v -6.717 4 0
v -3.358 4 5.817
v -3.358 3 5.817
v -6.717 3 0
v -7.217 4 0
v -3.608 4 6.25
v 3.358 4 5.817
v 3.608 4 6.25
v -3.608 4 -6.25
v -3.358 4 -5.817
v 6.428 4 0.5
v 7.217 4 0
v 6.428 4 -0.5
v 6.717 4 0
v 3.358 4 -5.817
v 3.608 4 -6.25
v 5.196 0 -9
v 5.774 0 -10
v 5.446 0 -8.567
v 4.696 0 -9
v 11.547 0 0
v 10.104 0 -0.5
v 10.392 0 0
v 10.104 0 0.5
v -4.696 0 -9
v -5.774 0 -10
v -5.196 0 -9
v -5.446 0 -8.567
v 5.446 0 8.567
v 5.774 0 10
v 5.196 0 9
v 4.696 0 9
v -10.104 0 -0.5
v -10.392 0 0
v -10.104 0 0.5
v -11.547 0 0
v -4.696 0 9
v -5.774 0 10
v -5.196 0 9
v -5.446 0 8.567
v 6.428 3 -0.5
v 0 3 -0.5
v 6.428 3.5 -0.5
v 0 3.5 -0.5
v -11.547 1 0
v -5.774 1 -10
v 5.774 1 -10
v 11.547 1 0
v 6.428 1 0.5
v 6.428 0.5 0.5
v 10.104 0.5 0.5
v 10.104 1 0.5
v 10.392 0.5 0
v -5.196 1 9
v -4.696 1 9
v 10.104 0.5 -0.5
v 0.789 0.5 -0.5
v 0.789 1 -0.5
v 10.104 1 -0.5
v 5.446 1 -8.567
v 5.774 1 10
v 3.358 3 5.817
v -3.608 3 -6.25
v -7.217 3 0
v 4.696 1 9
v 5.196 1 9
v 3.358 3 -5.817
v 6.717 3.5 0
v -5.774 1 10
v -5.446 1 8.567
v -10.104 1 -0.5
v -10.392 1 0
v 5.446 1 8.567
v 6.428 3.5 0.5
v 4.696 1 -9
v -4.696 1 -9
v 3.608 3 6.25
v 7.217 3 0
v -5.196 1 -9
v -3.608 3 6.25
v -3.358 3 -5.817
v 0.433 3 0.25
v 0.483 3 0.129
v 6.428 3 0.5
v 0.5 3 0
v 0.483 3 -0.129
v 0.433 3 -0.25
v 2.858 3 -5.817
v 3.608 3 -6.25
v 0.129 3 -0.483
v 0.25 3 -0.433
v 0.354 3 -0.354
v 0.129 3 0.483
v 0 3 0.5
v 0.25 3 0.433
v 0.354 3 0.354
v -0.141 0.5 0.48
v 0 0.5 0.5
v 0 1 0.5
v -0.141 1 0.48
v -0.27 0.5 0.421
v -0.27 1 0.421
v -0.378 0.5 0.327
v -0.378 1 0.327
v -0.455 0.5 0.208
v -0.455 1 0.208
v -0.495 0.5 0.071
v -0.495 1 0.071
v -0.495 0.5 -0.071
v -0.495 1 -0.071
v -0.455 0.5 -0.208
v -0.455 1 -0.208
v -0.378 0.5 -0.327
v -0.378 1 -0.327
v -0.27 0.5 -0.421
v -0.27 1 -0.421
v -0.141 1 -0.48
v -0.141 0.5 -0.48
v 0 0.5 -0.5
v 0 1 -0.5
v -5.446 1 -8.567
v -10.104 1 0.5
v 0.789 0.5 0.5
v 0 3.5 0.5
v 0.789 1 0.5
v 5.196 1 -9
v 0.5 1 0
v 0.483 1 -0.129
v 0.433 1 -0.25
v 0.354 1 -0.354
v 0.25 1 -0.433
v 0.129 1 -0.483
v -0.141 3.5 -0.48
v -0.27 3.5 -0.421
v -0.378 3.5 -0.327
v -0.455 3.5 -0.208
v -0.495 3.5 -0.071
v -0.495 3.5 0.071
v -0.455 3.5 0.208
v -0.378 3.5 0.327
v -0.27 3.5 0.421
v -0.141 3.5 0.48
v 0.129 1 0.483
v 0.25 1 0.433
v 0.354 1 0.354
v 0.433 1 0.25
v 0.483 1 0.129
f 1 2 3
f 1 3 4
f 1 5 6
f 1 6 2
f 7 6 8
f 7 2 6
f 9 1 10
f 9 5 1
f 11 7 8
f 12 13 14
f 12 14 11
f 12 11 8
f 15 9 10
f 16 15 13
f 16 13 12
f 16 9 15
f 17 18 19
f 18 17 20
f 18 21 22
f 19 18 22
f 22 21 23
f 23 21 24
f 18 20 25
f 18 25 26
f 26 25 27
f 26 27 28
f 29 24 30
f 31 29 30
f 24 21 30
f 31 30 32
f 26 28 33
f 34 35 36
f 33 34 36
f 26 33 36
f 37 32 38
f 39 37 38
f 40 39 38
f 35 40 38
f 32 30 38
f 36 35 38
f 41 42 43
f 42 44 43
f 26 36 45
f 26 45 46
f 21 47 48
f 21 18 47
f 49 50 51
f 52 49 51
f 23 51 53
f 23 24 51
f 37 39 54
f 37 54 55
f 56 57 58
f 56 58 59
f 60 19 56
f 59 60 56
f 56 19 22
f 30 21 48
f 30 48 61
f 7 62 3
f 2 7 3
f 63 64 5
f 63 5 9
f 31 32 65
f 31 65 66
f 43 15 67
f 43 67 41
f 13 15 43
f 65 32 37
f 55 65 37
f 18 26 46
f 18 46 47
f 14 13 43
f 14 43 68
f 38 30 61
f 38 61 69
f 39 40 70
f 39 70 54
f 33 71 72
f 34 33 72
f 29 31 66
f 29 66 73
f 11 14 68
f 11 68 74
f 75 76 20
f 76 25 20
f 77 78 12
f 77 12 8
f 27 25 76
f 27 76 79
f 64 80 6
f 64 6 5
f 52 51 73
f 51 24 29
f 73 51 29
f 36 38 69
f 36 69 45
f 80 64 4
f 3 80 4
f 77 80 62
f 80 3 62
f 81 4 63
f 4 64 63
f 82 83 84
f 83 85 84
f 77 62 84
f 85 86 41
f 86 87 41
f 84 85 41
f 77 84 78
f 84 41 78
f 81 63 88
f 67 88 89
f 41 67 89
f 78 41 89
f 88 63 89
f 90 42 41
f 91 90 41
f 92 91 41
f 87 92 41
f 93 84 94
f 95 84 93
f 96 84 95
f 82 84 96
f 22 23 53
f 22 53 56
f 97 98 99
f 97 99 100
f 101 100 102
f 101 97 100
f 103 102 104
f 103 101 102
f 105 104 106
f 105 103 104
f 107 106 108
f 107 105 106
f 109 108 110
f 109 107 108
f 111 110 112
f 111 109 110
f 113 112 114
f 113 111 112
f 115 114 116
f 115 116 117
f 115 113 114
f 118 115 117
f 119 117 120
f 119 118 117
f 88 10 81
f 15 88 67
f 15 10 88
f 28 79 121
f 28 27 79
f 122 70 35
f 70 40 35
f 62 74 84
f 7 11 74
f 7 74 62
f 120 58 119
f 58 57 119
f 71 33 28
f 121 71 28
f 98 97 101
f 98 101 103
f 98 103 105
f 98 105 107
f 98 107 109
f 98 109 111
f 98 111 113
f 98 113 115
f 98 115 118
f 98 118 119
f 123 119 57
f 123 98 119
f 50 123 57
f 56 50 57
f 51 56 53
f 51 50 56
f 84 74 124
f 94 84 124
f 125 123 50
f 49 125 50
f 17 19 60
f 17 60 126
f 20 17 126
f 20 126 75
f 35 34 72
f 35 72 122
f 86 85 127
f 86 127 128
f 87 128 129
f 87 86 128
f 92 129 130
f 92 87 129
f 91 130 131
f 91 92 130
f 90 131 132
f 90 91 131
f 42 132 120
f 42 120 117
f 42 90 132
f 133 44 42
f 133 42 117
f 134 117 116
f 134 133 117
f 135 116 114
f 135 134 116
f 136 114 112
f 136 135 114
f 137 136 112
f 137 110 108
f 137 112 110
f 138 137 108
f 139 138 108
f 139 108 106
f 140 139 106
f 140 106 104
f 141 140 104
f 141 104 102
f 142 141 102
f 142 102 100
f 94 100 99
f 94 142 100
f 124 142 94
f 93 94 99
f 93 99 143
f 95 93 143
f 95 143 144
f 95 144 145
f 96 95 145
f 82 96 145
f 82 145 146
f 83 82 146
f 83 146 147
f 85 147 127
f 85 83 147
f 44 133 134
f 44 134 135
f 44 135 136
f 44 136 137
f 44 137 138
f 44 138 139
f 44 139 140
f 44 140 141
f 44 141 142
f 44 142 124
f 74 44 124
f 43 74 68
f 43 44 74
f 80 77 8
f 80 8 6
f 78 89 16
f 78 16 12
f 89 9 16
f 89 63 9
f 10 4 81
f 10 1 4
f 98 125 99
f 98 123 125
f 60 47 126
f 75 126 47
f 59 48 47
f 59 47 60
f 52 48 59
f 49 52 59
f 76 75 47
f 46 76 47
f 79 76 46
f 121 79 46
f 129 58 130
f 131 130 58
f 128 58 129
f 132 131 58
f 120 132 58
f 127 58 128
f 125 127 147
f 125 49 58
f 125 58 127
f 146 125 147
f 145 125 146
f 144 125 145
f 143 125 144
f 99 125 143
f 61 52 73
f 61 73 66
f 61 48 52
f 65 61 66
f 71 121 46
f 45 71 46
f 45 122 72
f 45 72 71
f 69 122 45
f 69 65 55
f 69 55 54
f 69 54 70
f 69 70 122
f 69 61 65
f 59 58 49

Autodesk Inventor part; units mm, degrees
ref_plane "YZ Plane" through (0, 0, 0) normal (1, 0, 0) x (0, 1, 0)
ref_plane "XZ Plane" through (0, 0, 0) normal (0, 1, 0) x (-1, 0, 0)
ref_plane "XY Plane" through (0, 0, 0) normal (0, 0, 1) x (1, 0, 0)
sketch "Sketch1" plane through (0, 0, 0) normal (0, 1, 0) x (-1, 0, 0)
  line L0 (5.7735, 10) -> (11.547, 0)
  line L1 (11.547, 0) -> (5.7735, -10)
  line L2 (5.7735, -10) -> (-5.7735, -10)
  line L3 (-5.7735, -10) -> (-11.547, 0)
  line L4 (-11.547, 0) -> (-5.7735, 10)
  line L5 (-5.7735, 10) -> (5.7735, 10)
  line L6 (10.3923, 0) -> (5.1962, -9)
  line L7 (5.1962, -9) -> (-5.1962, -9)
  line L8 (-5.1962, -9) -> (-10.3923, 0)
  line L9 (-10.3923, 0) -> (-5.1962, 9)
  line L10 (-5.1962, 9) -> (5.1962, 9)
  line L11 (5.1962, 9) -> (10.3923, 0)
  line L12 (0, 0.5) -> (11.2583, 0.5)
  line L13 (0, 0) -> (5.7735, 10)
  line L14 (0, 0) -> (-5.7735, 10)
  line L15 (11.547, 0) -> (-11.547, 0)
  line L16 (0, 0.5) -> (-11.2583, 0.5)
  line L17 (-0.5, 0) -> (-6.0235, 9.567)
  line L18 (0.5, 0) -> (-5.2735, 10)
  line L19 (-0.5, 0) -> (5.2735, 10)
  line L20 (-0.5, 0) -> (11.047, 0) construction
  line L21 (0.5, 0) -> (6.0235, 9.567)
  line L22 (0, -0.5) -> (11.2583, -0.5)
  line L23 (0, 0) -> (5.7735, -10)
  line L24 (0, 0) -> (-5.7735, -10)
  line L25 (0, -0.5) -> (-11.2583, -0.5)
  line L26 (-0.5, 0) -> (-6.0235, -9.567)
  line L27 (0.5, 0) -> (-5.2735, -10)
  line L28 (-0.5, 0) -> (5.2735, -10)
  line L29 (0.5, 0) -> (6.0235, -9.567)
  point P0 (-10.1036, 0.5)
  point P1 (-5.4462, 8.567)
  point P2 (-0.7887, 0.5)
  point P3 (10.1036, 0.5)
  point P4 (0.7887, 0.5)
  point P5 (5.4462, 8.567)
  point P6 (4.6962, -9)
  point P7 (-4.6962, -9)
  point P8 (0, -0.866)
  point P9 (-5.4462, -8.567)
  point P10 (-10.1036, -0.5)
  point P11 (-0.7887, -0.5)
  point P12 (10.1036, -0.5)
  point P13 (5.4462, -8.567)
  point P14 (0.7887, -0.5)
  point P15 (-4.6962, 9)
  point P16 (4.6962, 9)
  point P17 (0, 0.866)
  dimension "d0" = 20
  dimension "d1" = 18
  dimension "d2" = 60
extrude "Extrusion1" add sketch "Sketch1" along normal blind 1 contours L13 L10 L19 L5 | L0 L21 L11 L13 | L0 L12 L11 L21 | L19 L10 L18 L5 | L13 L12 L18 L19 L10 | L11 L21 L12 L13 | L0 L15 L11 L12 | L18 L10 L14 L5 | L13 L18 L12 | L12 L21 L18 L13 | L1 L22 L6 L15 | L11 L15 L21 L12 | L14 L9 L17 L4 | L18 L19 L16 L14 L10 | L18 L12 L16 L19 | L18 L13 L14 L19 L16 L12 | L18 L15 L13 | L1 L29 L6 L22 | L6 L22 L29 L15 | L27 L23 L15 | L29 L22 L23 L27 | L17 L9 L16 L4 | L14 L16 L17 L9 | L19 L14 L16 | L15 L19 L14 | L24 L28 L15 | L23 L27 L22 L25 L28 L24 | L1 L23 L6 L29 | L23 L22 L27 | L29 L6 L23 L22 | L16 L9 L15 L4 | L14 L19 L17 L16 | L26 L25 L8 L15 | L15 L9 L16 L17 | L28 L24 L25 L26 | L28 L25 L24 | L2 L28 L7 L23 | L23 L7 L28 L27 L22 | L27 L28 L25 L22 | L15 L8 L25 L3 | L25 L24 L8 L26 | L25 L28 L27 L7 L24 | L2 L27 L7 L28 | L25 L8 L26 L3 | L8 L24 L3 L26 | L7 L27 L2 L24
sketch "Sketch2" plane through (0, 1, 0) normal (0, 1, 0) x (1, 0, 0)
  circle A0 centre (0, 0) radius 0.5
  dimension "d5" = 1
extrude "Extrusion2" add sketch "Sketch2" along normal blind 2
sketch "Sketch3" plane through (0, 3, 0) normal (0, 1, 0) x (1, 0, 0)
  line L0 (-3.6084, -6.25) -> (-7.2169, 0)
  line L1 (-7.2169, 0) -> (-3.6084, 6.25)
  line L2 (-3.6084, 6.25) -> (3.6084, 6.25)
  line L3 (3.6084, 6.25) -> (7.2169, 0)
  line L4 (7.2169, 0) -> (3.6084, -6.25)
  line L5 (3.6084, -6.25) -> (-3.6084, -6.25)
  line L6 (-0.7887, -0.5) -> (-5.4462, -8.567) projected
  line L7 (-3.8584, -5.817) -> (3.1084, 6.25)
  line L8 (-5.4462, 8.567) -> (-0.7887, 0.5) projected
  line L9 (-3.8584, 5.817) -> (3.1084, -6.25)
  line L10 (-0.7887, 0.5) -> (-10.1036, 0.5) projected
  line L11 (-6.9282, 0.5) -> (6.9282, 0.5)
  line L12 (-10.1036, -0.5) -> (-0.7887, -0.5) projected
  line L13 (-6.9282, -0.5) -> (6.9282, -0.5)
  line L14 (0.7887, -0.5) -> (10.1036, -0.5) projected
  line L15 (-4.6962, -9) -> (0, -0.866) projected
  line L16 (-3.1084, -6.25) -> (3.8584, 5.817)
  line L17 (0, 0.866) -> (-4.6962, 9) projected
  line L18 (-3.1084, 6.25) -> (3.8584, -5.817)
  line L19 (-0.0006, -5.817) -> (3.8584, -5.817)
  line L20 (-0.0006, -5.817) -> (-3.8584, -5.817)
  line L21 (3.1084, -6.25) -> (6.9282, 0.5)
  line L22 (-3.1084, -6.25) -> (-6.9282, 0.5)
  line L23 (-7.2169, 0) -> (7.2169, 0)
  line L24 (-0.0006, 5.817) -> (3.8584, 5.817)
  line L25 (-0.0006, 5.817) -> (-3.8584, 5.817)
  line L26 (3.1084, 6.25) -> (6.9282, -0.5)
  line L27 (-3.1084, 6.25) -> (-6.9282, -0.5)
  point P0 (0, 0)
  point P1 (0, 0)
  point P2 (-2.8584, 5.817)
  point P3 (2.8584, 5.817)
  point P4 (-6.3623, 0.5)
  point P5 (-3.6034, 5.3753)
  point P6 (2.8584, -5.817)
  point P7 (-2.8584, -5.817)
  point P8 (-3.6034, -5.3753)
  point P9 (-6.3623, -0.5)
  point P10 (3.6034, -5.3753)
  point P11 (6.3623, -0.5)
  point P12 (6.3623, 0.5)
  point P13 (0.7887, 0.5)
  point P14 (3.6034, 5.3753)
  dimension "d8" = 12.5
extrude "Extrusion3" add sketch "Sketch3" along normal blind 1 contours L0 L20 L22 L5 | L0 L12 L22 L6 | L6 L22 L20 | L15 L20 L19 L9 L5 | L22 L20 L15 | L27 L22 L12 | L0 L23 L27 | L6 L13 L9 L15 L20 L22 | L21 L19 L4 L5 | L9 L19 L21 | L1 L22 L23 | L22 L23 L7 L12 | L27 L10 L9 L23 | L22 L10 L27 | L7 L9 L13 | L9 L16 L13 L18 L21 L19 | L21 L18 L19 | L9 L13 L16 | L1 L8 L27 L10 | L9 L11 L7 | L23 L16 L13 L9 | L7 L11 L18 L23 | L18 L21 L13 L4 | L16 L18 L13 | L25 L27 L8 | L1 L2 L27 L25 | L11 L8 L27 L25 L17 L7 | L7 L18 L11 | L18 L11 L16 | L23 L21 L13 L18 | L16 L11 L26 L23 | L26 L23 L4 | L13 L21 L26 | L27 L17 L25 | L7 L24 L26 L16 L11 L18 | L26 L11 L21 | L21 L3 L23 | L2 L7 L24 L25 L17 | L7 L26 L24 | L26 L16 L3 L11 | L26 L24 L16 | L2 L3 L24 L26
sketch "Sketch4" plane through (0, 4, 0) normal (0, 1, 0) x (1, 0, 0)
  line L0 (-2.8584, 5.817) -> (2.8584, 5.817) projected
  line L1 (3.3584, 5.817) -> (6.7169, 0)
  line L2 (6.7169, 0) -> (3.3584, -5.817)
  line L3 (3.3584, -5.817) -> (-3.3584, -5.817)
  line L4 (-3.3584, -5.817) -> (-6.7169, 0)
  line L5 (-6.7169, 0) -> (-3.3584, 5.817)
  line L6 (-3.3584, 5.817) -> (3.3584, 5.817)
  circle A0 centre (0, 0) radius 0.5 projected
  line L7 (0, 0.5) -> (6.4282, 0.5)
  line L8 (6.4282, -0.5) -> (0, -0.5)
  arc A1 (0, 0.5) -> (0, -0.5) centre (0, 0) ccw
  point P0 (0, 5.817)
extrude "Extrusion4" cut sketch "Sketch4" against normal blind 1 contours L0 L6 L1 L7 A0 L8 L2 L3 L4 L5
sketch "Sketch5" plane through (0, 4, 0) normal (0, 1, 0) x (1, 0, 0)
  line L0 (3.3584, 5.817) -> (6.4282, 0.5) projected
  line L1 (6.2201, 0.8605) -> (6.7169, 0)
  line L2 (0, -0.5) -> (6.4282, -0.5) projected
  line L3 (6.7169, 0) -> (6.4282, -0.5)
  line L4 (6.4282, -0.5) -> (0, -0.5)
  circle A0 centre (0, 0) radius 0.5 projected
  arc A1 (0, 0.5) -> (0, -0.5) centre (0, 0) ccw
  line L5 (0, 0.5) -> (6.2201, 0.8605)
extrude "Extrusion5" cut sketch "Sketch5" against normal blind 0.5
sketch "Sketch6" plane through (0, 0, 0) normal (0, -1, 0) x (1, 0, 0)
  line L0 (10.3923, 0) -> (5.1962, -9)
  line L1 (5.1962, -9) -> (-5.1962, -9)
  line L2 (-5.1962, -9) -> (-10.3923, 0)
  line L3 (-10.3923, 0) -> (-5.1962, 9)
  line L4 (-5.1962, 9) -> (5.1962, 9)
  line L5 (5.1962, 9) -> (10.3923, 0)
  line L6 (10.1036, -0.5) -> (0, -0.5)
  line L7 (0.7887, 0.5) -> (10.1036, 0.5) projected
  line L8 (6.4282, 0.5) -> (0, 0.5) projected
  line L9 (0, -0.5) -> (0, 0.5)
  line L10 (0, 0.5) -> (10.1036, 0.5)
  arc A0 (0, 0.5) -> (0, -0.5) centre (0, 0) ccw projected
  arc A1 (0, 0.5) -> (0, -0.5) centre (0, 0) ccw
  dimension "d15" = 18
extrude "Extrusion6" cut sketch "Sketch6" against normal blind 1 contours L0 L1 L2 L3 L4 L5 L7 L8 A0 L6
sketch "Sketch7" plane through (0, 0, 0) normal (0, -1, 0) x (1, 0, 0)
  line L0 (10.1036, 0.5) -> (5.1962, 9) projected
  line L1 (9.7836, 1.0542) -> (10.3923, 0)
  line L2 (10.3923, 0) -> (10.1036, -0.5)
  line L3 (10.1036, -0.5) -> (0, -0.5)
  arc A0 (0, 0.5) -> (0, -0.5) centre (0, 0) ccw
  line L4 (0, 0.5) -> (9.7836, 1.0542)
  point P0 (0, 0)
extrude "Extrusion7" cut sketch "Sketch7" against normal blind 0.5
sketch "Sketch8" plane through (-7.2169, 3, 0) normal (-0.866, 0, -0.5) x (-0.5, 0, 0.866)
  line L0 (-4.0415, 0.5) -> (-3.1084, 0.5) projected
  circle A0 centre (-3.6084, 0.5) radius 0.5022
  point P0 (-3.6084, -3)
  point P1 (-3.1754, 0.5)
